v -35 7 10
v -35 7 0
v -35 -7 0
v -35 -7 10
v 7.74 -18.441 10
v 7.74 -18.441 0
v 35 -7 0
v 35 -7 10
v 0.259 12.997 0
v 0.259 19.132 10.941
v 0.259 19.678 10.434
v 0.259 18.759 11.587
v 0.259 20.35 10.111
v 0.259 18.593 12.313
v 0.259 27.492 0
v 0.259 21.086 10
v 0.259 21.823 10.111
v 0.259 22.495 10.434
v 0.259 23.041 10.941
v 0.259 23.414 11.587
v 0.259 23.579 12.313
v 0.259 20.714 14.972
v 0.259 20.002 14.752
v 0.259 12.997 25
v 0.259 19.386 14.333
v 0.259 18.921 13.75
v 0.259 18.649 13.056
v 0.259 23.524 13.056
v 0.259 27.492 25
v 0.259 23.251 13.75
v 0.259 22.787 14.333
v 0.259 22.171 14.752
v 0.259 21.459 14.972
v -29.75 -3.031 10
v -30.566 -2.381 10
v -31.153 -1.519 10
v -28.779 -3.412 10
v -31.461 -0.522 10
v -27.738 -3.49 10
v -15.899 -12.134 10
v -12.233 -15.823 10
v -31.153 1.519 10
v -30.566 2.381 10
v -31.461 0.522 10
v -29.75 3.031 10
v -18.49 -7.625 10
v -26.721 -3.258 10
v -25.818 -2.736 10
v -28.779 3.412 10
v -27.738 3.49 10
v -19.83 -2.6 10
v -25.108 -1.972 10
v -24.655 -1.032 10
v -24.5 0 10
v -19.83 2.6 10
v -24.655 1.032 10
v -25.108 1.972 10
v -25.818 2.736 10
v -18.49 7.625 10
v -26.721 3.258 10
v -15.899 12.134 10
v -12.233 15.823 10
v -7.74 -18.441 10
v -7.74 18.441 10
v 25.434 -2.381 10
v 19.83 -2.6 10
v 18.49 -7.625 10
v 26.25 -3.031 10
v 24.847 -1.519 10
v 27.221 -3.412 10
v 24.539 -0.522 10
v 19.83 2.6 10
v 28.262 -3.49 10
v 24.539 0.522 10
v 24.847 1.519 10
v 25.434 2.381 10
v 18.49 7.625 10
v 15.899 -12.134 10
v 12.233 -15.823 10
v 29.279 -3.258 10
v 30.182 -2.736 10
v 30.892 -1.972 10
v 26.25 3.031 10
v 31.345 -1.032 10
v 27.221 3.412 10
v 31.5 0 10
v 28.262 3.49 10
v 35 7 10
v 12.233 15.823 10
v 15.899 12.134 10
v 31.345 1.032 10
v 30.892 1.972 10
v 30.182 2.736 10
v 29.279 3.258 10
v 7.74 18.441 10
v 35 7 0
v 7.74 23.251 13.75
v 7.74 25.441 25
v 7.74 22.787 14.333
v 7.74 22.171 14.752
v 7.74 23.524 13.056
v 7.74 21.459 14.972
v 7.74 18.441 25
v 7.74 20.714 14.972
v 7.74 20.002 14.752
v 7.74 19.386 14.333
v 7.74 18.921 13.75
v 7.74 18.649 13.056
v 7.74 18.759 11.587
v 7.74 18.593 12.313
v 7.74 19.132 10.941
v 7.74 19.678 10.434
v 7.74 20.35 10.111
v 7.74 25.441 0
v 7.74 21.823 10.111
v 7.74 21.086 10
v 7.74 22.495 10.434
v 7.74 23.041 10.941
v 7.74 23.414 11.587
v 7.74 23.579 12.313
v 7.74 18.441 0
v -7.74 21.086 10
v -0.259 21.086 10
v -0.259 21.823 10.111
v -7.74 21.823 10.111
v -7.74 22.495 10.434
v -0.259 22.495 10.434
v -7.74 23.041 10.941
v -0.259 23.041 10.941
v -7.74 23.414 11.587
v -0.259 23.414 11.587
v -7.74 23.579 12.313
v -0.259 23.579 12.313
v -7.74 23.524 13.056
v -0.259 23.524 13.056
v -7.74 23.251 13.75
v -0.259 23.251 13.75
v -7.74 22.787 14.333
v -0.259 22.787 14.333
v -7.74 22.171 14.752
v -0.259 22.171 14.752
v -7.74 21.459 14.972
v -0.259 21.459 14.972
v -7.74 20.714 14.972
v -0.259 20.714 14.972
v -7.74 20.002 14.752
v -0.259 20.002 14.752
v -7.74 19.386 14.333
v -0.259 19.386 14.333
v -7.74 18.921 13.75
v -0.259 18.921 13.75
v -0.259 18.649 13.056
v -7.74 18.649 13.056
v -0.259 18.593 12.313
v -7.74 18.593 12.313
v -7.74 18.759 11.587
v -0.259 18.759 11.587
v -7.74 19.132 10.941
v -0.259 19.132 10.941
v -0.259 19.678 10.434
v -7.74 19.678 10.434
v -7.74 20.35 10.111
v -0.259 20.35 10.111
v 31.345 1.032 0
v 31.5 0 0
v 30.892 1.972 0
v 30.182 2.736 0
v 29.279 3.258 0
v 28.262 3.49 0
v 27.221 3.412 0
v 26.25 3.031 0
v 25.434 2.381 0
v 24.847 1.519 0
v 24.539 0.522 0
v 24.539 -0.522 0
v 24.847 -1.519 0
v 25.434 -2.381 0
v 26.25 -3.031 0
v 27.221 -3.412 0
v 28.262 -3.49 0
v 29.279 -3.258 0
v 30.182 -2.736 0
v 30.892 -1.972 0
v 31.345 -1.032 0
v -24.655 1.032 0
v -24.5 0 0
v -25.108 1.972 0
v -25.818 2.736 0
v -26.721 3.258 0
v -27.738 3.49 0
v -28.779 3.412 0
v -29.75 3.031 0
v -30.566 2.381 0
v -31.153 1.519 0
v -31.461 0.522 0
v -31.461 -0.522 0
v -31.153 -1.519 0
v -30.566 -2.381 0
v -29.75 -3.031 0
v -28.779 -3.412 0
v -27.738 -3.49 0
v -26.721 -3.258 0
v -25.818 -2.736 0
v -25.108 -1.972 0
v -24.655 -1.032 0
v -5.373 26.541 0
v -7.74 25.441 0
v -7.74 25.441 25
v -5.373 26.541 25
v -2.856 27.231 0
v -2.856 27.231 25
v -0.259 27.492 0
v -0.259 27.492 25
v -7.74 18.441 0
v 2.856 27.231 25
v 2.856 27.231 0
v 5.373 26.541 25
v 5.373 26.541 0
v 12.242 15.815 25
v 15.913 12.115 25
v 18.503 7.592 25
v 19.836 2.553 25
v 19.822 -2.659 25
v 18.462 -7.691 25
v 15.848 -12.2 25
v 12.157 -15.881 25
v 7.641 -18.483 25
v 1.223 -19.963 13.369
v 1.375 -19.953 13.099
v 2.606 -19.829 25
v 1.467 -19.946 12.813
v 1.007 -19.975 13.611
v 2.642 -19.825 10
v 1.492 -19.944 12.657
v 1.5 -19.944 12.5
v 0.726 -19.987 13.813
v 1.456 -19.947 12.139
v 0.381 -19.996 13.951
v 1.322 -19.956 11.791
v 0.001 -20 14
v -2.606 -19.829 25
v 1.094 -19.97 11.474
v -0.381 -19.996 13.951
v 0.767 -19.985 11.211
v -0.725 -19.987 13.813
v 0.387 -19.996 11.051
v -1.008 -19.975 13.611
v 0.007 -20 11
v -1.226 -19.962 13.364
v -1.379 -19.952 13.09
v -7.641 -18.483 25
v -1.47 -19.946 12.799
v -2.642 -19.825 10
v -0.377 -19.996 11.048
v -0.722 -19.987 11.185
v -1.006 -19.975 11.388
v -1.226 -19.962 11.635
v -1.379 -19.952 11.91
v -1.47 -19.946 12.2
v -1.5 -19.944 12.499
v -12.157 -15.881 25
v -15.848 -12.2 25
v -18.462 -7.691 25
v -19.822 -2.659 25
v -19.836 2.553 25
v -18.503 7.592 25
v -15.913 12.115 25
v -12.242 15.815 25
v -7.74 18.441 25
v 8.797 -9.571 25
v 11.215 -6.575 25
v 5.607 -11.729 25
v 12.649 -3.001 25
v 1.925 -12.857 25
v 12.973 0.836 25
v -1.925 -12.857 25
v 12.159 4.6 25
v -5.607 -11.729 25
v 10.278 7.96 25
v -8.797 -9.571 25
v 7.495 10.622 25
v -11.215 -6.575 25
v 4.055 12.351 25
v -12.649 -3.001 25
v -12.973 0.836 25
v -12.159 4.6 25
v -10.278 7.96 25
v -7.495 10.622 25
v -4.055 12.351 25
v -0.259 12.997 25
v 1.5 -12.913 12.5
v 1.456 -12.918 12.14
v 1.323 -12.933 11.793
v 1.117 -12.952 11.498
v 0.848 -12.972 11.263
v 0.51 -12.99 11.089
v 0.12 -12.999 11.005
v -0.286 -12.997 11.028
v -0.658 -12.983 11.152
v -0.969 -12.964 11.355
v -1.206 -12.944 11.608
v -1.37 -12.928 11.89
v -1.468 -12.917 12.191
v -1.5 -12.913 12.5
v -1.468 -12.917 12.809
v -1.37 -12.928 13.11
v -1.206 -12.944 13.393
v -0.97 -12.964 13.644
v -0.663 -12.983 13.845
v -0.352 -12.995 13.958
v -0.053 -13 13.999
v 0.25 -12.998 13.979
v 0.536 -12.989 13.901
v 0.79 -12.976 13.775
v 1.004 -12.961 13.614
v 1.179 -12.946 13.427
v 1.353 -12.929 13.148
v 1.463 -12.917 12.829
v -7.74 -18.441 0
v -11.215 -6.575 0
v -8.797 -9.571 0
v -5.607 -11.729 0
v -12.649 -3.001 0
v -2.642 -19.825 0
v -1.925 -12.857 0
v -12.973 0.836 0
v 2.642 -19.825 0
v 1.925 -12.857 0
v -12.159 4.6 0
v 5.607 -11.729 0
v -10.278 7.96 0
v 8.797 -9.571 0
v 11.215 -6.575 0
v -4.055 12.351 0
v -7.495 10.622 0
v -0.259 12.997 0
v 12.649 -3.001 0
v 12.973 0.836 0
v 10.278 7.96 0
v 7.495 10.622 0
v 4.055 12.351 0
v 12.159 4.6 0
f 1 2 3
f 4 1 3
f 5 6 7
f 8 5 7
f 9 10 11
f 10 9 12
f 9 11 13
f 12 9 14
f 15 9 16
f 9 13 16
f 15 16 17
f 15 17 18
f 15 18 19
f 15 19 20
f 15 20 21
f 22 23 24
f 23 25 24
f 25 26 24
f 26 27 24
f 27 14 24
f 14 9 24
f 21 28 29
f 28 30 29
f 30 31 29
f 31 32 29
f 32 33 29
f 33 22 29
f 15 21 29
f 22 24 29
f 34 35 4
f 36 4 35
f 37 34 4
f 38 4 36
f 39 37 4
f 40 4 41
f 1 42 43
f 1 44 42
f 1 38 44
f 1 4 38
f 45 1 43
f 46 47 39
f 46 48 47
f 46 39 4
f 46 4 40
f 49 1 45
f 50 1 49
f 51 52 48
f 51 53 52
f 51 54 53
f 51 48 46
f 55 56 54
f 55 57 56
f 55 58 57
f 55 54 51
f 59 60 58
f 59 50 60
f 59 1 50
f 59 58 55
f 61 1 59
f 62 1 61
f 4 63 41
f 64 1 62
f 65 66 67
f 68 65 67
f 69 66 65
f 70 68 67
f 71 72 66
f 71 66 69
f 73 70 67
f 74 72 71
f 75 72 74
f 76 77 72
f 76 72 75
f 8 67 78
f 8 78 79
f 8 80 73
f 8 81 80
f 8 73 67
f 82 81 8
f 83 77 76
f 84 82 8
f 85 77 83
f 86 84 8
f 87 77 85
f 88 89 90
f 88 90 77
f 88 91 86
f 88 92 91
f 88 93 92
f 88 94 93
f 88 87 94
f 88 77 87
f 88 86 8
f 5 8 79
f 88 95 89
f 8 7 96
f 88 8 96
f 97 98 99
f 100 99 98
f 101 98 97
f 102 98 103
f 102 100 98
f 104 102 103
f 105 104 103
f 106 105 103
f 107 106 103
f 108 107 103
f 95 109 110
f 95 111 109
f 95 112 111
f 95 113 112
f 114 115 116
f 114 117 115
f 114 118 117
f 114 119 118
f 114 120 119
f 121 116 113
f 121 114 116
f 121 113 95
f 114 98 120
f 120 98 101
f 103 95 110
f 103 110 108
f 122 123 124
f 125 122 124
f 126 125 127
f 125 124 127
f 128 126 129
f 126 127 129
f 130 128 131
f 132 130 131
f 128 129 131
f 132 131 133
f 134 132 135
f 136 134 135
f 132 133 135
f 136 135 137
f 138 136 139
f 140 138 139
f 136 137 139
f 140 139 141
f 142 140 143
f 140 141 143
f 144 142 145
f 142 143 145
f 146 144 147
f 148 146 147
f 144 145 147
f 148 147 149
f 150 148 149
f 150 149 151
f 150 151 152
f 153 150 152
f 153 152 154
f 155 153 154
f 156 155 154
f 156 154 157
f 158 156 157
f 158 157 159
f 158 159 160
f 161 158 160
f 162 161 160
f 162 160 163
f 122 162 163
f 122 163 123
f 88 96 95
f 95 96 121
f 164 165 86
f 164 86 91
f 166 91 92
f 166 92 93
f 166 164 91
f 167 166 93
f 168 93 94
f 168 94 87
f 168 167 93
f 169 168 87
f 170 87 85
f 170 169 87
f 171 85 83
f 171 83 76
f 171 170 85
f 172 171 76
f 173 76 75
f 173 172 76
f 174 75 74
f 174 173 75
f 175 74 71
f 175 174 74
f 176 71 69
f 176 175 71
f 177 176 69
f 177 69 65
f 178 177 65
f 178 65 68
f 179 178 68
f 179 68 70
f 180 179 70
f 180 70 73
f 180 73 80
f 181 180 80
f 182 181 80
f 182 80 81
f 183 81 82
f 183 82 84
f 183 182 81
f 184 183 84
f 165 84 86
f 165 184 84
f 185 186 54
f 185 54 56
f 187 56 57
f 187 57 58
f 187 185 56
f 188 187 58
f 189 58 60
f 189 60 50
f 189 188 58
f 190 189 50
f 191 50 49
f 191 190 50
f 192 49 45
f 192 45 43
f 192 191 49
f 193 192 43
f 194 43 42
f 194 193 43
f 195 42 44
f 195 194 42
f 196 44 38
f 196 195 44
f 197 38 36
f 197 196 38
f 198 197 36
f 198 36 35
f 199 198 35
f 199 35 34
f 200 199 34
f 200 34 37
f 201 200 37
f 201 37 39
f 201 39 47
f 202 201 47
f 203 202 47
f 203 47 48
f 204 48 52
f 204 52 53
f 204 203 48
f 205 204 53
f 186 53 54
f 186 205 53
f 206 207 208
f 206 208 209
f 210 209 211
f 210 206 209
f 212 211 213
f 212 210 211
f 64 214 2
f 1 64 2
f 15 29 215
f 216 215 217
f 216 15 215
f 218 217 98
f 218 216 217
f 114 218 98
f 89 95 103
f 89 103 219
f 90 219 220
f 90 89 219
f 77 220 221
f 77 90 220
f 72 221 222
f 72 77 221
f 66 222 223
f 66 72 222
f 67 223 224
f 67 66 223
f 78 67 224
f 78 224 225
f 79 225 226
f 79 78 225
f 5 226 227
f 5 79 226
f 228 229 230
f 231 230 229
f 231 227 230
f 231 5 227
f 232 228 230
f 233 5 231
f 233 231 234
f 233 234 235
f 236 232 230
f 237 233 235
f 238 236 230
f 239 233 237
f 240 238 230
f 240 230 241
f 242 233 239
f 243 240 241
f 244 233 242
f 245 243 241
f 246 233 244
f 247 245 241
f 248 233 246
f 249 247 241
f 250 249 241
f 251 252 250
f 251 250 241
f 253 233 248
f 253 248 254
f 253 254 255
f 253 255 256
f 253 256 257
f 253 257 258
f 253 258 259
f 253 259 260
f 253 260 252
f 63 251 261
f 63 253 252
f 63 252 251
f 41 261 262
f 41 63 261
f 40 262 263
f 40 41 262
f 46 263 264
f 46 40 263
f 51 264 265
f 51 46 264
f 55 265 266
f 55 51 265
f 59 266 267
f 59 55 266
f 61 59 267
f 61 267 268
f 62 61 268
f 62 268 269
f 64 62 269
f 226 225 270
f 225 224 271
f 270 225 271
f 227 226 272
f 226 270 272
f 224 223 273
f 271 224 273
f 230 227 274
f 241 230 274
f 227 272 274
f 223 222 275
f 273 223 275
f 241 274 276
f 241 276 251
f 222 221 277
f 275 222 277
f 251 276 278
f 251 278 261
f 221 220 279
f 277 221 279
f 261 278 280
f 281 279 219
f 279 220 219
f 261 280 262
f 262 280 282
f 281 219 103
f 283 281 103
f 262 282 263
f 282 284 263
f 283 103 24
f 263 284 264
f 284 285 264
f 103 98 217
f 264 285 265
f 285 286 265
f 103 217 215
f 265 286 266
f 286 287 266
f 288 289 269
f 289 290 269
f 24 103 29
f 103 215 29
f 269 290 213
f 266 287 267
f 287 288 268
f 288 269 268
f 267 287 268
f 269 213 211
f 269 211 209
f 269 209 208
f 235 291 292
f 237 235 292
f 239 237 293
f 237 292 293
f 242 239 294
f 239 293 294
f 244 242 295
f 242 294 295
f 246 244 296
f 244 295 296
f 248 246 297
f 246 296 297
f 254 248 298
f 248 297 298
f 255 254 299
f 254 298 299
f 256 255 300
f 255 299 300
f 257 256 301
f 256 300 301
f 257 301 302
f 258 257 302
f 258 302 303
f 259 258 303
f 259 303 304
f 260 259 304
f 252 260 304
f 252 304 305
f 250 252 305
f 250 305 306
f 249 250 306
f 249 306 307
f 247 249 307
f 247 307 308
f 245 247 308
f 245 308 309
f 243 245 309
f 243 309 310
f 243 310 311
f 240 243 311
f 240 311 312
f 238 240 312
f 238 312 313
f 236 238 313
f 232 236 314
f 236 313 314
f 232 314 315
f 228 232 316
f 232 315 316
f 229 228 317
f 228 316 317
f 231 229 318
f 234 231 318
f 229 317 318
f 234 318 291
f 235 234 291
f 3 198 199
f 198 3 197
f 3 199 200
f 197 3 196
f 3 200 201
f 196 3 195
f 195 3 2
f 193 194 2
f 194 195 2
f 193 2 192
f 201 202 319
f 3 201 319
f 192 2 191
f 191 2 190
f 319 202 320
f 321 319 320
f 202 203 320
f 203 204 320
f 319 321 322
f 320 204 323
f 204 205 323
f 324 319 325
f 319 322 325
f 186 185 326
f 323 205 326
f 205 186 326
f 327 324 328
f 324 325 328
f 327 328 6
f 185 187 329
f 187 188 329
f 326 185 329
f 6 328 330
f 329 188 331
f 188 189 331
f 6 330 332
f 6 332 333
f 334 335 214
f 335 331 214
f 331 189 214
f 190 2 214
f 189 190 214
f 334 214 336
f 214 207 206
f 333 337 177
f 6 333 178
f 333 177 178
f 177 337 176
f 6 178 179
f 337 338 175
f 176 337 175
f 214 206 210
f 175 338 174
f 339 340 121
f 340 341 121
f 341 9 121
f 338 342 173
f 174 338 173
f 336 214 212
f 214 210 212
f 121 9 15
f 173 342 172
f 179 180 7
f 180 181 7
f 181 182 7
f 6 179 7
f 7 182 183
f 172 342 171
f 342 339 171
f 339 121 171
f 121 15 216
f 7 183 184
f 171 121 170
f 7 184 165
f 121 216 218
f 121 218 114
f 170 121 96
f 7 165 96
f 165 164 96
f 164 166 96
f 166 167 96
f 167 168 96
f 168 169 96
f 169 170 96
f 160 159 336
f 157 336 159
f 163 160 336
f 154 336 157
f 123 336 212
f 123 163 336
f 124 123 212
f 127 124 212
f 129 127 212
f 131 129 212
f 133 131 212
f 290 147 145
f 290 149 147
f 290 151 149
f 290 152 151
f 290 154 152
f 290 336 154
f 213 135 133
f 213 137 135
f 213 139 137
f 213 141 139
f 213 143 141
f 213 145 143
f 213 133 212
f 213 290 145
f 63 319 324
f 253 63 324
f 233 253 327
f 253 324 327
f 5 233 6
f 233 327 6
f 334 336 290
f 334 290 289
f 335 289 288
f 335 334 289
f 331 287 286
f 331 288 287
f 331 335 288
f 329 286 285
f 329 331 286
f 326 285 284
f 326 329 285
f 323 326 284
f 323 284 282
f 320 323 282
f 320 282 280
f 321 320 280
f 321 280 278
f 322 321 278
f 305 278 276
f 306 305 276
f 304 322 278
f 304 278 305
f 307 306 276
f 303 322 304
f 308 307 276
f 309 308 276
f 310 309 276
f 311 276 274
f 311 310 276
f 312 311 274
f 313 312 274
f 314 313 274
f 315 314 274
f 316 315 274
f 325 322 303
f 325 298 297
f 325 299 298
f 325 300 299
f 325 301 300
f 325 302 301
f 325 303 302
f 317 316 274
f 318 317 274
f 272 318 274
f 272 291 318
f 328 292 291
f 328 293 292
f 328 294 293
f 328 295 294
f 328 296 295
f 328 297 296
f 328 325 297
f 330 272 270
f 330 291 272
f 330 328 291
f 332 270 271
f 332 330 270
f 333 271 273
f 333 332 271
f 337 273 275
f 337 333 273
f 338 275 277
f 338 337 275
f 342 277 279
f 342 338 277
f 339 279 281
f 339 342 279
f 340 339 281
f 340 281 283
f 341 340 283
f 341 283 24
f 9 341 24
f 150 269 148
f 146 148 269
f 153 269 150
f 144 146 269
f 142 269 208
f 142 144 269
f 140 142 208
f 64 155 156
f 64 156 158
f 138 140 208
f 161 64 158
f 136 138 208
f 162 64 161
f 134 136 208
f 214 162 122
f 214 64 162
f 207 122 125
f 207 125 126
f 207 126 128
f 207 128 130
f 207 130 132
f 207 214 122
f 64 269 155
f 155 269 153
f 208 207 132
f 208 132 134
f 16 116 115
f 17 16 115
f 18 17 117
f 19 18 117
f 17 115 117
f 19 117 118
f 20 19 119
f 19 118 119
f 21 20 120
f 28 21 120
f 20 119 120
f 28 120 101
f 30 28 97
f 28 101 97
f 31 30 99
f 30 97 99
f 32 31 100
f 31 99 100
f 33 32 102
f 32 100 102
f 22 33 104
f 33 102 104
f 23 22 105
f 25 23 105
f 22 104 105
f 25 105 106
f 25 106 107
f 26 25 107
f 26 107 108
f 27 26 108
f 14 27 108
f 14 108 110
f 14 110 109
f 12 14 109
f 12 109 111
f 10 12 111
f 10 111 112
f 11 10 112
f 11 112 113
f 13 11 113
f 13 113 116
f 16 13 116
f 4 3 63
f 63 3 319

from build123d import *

# Parameters (mm, degrees)
SKETCH_1_R          = 3.5
SKETCH_1_R_2        = 13
EXTRUDE_2_DEPTH     = 10
SKETCH_2_R          = 13
EXTRUDE_3_DEPTH     = 15
SKETCH_3_W          = 0.517195108
SKETCH_3_H          = 18.726193104
CUT_EXTRUDE_1_DEPTH = 26
SKETCH_4_R          = 2.5
CUT_EXTRUDE_2_DEPTH = 43.740275714
SKETCH_5_R          = 1.5
CUT_EXTRUDE_3_DEPTH = 21


with BuildPart() as part:
    # 草图1 → 凸台-拉伸2 (new body)
    with BuildSketch(Plane.XY):
        with BuildLine():
            Line((-35, -7), (-7.740275714, -18.44147857))
            ThreePointArc((-7.740275714, -18.44147857), (0, -20), (7.740275714, -18.44147857))
            Line((7.740275714, -18.44147857), (35, -7))
            Line((35, -7), (35, 7))
            Line((35, 7), (7.740275714, 18.44147857))
            Line((7.740275714, 18.44147857), (7.740275714, 25.44147857))
            ThreePointArc((7.740275714, 25.44147857), (0, 27.494244152), (-7.740275714, 25.44147857))
            Line((-7.740275714, 25.44147857), (-7.740275714, 18.44147857))
            Line((-7.740275714, 18.44147857), (-35, 7))
            Line((-35, 7), (-35, -7))
        make_face()
        with Locations((-28, 0)):
            Circle(SKETCH_1_R, mode=Mode.SUBTRACT)
        Circle(SKETCH_1_R_2, mode=Mode.SUBTRACT)
        with Locations((28, 0)):
            Circle(SKETCH_1_R, mode=Mode.SUBTRACT)
    extrude(amount=EXTRUDE_2_DEPTH)

    # 草图2 → 凸台-拉伸3 (add)
    with BuildSketch(Plane.XY.offset(10)):
        with BuildLine():
            Line((-7.740275714, 18.44147857), (-7.740275714, 25.44147857))
            ThreePointArc((-7.740275714, 25.44147857), (0, 27.494244152), (7.740275714, 25.44147857))
            Line((7.740275714, 25.44147857), (7.740275714, 18.44147857))
            ThreePointArc((7.740275714, 18.44147857), (0, -20), (-7.740275714, 18.44147857))
        make_face()
        Circle(SKETCH_2_R, mode=Mode.SUBTRACT)
    extrude(amount=EXTRUDE_3_DEPTH)

    # 草图3 → 切除-拉伸1 (cut, through all)
    with BuildSketch(Plane.XY.offset(25)):
        with Locations((0, 21.741202931)):
            Rectangle(SKETCH_3_W, SKETCH_3_H)
    extrude(amount=-CUT_EXTRUDE_1_DEPTH, mode=Mode.SUBTRACT)

    # 草图4 → 切除-拉伸2 (cut, through all)
    with BuildSketch(Plane(origin=(7.740275714, 0, 0), x_dir=(0, 0, -1), z_dir=(1, 0, 0))):
        with Locations((-12.5, 21.086423576)):
            Circle(SKETCH_4_R)
    extrude(amount=-CUT_EXTRUDE_2_DEPTH, mode=Mode.SUBTRACT)

    # 草图5 → 切除-拉伸3 (cut, through all)
    with BuildSketch(Plane(origin=(0, 0, 0), x_dir=(1, 0, 0), z_dir=(0, 1, 0))):
        with Locations((0, -12.5)):
            Circle(SKETCH_5_R)
    extrude(amount=-CUT_EXTRUDE_3_DEPTH, mode=Mode.SUBTRACT)


solid = part.part
